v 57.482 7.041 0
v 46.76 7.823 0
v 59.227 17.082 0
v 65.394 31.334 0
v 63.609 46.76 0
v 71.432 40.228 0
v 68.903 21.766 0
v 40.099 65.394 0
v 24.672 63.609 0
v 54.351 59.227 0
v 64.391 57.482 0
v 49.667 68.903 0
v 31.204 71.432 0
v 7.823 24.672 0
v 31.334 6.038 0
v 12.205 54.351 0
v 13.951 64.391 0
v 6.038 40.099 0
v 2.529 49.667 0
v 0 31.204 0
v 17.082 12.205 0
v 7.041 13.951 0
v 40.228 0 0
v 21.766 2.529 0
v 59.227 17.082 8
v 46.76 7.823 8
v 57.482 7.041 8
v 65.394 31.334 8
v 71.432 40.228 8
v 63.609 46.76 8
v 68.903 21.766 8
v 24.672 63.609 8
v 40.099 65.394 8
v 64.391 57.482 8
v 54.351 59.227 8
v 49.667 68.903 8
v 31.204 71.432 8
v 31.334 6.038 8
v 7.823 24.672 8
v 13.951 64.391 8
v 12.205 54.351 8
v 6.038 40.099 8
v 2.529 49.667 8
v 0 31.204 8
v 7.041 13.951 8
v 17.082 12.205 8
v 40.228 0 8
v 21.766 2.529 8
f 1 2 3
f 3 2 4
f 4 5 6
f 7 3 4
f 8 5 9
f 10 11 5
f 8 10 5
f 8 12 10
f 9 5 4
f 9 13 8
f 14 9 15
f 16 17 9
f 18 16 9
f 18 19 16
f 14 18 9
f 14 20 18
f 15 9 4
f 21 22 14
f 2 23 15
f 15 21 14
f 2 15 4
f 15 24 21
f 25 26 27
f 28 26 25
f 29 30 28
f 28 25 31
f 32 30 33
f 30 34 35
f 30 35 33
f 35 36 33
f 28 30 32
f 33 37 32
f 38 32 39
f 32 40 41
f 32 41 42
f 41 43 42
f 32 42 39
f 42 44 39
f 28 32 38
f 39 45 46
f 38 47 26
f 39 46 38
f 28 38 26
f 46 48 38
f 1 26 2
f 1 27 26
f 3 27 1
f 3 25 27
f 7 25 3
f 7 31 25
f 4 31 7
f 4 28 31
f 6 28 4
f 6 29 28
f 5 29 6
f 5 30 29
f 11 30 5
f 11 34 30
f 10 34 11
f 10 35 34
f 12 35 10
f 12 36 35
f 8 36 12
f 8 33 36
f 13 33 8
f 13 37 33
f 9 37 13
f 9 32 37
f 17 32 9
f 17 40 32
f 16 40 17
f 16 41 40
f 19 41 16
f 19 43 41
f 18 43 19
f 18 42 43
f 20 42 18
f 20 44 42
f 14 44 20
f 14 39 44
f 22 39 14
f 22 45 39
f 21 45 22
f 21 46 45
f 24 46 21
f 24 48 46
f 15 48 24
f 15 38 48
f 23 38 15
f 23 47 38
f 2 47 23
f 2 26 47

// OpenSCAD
$fn = 32;

// ----------------------------------------------------------------------
// Chain sprocket: 12 teeth, 30 mm root radius
// ----------------------------------------------------------------------

// --- parameters (mm) ---
profile_height = 8;       // extrusion height
profile_points = 24;      // points of the closed outline

profile = [[65.394, 31.334], [71.432, 40.228], [63.609, 46.76], [64.391, 57.482], [54.351, 59.227], [49.667, 68.903], [40.099, 65.394], [31.204, 71.432], [24.672, 63.609], [13.951, 64.391], [12.205, 54.351], [2.529, 49.667], [6.038, 40.099], [0, 31.204], [7.823, 24.672], [7.041, 13.951], [17.082, 12.205], [21.766, 2.529], [31.334, 6.038], [40.228, 0], [46.76, 7.823], [57.482, 7.041], [59.227, 17.082], [68.903, 21.766]];  // single closed polygon, 24 points, counter clockwise

// --- the one profile operation ---
linear_extrude(height = profile_height) polygon(points = profile);
